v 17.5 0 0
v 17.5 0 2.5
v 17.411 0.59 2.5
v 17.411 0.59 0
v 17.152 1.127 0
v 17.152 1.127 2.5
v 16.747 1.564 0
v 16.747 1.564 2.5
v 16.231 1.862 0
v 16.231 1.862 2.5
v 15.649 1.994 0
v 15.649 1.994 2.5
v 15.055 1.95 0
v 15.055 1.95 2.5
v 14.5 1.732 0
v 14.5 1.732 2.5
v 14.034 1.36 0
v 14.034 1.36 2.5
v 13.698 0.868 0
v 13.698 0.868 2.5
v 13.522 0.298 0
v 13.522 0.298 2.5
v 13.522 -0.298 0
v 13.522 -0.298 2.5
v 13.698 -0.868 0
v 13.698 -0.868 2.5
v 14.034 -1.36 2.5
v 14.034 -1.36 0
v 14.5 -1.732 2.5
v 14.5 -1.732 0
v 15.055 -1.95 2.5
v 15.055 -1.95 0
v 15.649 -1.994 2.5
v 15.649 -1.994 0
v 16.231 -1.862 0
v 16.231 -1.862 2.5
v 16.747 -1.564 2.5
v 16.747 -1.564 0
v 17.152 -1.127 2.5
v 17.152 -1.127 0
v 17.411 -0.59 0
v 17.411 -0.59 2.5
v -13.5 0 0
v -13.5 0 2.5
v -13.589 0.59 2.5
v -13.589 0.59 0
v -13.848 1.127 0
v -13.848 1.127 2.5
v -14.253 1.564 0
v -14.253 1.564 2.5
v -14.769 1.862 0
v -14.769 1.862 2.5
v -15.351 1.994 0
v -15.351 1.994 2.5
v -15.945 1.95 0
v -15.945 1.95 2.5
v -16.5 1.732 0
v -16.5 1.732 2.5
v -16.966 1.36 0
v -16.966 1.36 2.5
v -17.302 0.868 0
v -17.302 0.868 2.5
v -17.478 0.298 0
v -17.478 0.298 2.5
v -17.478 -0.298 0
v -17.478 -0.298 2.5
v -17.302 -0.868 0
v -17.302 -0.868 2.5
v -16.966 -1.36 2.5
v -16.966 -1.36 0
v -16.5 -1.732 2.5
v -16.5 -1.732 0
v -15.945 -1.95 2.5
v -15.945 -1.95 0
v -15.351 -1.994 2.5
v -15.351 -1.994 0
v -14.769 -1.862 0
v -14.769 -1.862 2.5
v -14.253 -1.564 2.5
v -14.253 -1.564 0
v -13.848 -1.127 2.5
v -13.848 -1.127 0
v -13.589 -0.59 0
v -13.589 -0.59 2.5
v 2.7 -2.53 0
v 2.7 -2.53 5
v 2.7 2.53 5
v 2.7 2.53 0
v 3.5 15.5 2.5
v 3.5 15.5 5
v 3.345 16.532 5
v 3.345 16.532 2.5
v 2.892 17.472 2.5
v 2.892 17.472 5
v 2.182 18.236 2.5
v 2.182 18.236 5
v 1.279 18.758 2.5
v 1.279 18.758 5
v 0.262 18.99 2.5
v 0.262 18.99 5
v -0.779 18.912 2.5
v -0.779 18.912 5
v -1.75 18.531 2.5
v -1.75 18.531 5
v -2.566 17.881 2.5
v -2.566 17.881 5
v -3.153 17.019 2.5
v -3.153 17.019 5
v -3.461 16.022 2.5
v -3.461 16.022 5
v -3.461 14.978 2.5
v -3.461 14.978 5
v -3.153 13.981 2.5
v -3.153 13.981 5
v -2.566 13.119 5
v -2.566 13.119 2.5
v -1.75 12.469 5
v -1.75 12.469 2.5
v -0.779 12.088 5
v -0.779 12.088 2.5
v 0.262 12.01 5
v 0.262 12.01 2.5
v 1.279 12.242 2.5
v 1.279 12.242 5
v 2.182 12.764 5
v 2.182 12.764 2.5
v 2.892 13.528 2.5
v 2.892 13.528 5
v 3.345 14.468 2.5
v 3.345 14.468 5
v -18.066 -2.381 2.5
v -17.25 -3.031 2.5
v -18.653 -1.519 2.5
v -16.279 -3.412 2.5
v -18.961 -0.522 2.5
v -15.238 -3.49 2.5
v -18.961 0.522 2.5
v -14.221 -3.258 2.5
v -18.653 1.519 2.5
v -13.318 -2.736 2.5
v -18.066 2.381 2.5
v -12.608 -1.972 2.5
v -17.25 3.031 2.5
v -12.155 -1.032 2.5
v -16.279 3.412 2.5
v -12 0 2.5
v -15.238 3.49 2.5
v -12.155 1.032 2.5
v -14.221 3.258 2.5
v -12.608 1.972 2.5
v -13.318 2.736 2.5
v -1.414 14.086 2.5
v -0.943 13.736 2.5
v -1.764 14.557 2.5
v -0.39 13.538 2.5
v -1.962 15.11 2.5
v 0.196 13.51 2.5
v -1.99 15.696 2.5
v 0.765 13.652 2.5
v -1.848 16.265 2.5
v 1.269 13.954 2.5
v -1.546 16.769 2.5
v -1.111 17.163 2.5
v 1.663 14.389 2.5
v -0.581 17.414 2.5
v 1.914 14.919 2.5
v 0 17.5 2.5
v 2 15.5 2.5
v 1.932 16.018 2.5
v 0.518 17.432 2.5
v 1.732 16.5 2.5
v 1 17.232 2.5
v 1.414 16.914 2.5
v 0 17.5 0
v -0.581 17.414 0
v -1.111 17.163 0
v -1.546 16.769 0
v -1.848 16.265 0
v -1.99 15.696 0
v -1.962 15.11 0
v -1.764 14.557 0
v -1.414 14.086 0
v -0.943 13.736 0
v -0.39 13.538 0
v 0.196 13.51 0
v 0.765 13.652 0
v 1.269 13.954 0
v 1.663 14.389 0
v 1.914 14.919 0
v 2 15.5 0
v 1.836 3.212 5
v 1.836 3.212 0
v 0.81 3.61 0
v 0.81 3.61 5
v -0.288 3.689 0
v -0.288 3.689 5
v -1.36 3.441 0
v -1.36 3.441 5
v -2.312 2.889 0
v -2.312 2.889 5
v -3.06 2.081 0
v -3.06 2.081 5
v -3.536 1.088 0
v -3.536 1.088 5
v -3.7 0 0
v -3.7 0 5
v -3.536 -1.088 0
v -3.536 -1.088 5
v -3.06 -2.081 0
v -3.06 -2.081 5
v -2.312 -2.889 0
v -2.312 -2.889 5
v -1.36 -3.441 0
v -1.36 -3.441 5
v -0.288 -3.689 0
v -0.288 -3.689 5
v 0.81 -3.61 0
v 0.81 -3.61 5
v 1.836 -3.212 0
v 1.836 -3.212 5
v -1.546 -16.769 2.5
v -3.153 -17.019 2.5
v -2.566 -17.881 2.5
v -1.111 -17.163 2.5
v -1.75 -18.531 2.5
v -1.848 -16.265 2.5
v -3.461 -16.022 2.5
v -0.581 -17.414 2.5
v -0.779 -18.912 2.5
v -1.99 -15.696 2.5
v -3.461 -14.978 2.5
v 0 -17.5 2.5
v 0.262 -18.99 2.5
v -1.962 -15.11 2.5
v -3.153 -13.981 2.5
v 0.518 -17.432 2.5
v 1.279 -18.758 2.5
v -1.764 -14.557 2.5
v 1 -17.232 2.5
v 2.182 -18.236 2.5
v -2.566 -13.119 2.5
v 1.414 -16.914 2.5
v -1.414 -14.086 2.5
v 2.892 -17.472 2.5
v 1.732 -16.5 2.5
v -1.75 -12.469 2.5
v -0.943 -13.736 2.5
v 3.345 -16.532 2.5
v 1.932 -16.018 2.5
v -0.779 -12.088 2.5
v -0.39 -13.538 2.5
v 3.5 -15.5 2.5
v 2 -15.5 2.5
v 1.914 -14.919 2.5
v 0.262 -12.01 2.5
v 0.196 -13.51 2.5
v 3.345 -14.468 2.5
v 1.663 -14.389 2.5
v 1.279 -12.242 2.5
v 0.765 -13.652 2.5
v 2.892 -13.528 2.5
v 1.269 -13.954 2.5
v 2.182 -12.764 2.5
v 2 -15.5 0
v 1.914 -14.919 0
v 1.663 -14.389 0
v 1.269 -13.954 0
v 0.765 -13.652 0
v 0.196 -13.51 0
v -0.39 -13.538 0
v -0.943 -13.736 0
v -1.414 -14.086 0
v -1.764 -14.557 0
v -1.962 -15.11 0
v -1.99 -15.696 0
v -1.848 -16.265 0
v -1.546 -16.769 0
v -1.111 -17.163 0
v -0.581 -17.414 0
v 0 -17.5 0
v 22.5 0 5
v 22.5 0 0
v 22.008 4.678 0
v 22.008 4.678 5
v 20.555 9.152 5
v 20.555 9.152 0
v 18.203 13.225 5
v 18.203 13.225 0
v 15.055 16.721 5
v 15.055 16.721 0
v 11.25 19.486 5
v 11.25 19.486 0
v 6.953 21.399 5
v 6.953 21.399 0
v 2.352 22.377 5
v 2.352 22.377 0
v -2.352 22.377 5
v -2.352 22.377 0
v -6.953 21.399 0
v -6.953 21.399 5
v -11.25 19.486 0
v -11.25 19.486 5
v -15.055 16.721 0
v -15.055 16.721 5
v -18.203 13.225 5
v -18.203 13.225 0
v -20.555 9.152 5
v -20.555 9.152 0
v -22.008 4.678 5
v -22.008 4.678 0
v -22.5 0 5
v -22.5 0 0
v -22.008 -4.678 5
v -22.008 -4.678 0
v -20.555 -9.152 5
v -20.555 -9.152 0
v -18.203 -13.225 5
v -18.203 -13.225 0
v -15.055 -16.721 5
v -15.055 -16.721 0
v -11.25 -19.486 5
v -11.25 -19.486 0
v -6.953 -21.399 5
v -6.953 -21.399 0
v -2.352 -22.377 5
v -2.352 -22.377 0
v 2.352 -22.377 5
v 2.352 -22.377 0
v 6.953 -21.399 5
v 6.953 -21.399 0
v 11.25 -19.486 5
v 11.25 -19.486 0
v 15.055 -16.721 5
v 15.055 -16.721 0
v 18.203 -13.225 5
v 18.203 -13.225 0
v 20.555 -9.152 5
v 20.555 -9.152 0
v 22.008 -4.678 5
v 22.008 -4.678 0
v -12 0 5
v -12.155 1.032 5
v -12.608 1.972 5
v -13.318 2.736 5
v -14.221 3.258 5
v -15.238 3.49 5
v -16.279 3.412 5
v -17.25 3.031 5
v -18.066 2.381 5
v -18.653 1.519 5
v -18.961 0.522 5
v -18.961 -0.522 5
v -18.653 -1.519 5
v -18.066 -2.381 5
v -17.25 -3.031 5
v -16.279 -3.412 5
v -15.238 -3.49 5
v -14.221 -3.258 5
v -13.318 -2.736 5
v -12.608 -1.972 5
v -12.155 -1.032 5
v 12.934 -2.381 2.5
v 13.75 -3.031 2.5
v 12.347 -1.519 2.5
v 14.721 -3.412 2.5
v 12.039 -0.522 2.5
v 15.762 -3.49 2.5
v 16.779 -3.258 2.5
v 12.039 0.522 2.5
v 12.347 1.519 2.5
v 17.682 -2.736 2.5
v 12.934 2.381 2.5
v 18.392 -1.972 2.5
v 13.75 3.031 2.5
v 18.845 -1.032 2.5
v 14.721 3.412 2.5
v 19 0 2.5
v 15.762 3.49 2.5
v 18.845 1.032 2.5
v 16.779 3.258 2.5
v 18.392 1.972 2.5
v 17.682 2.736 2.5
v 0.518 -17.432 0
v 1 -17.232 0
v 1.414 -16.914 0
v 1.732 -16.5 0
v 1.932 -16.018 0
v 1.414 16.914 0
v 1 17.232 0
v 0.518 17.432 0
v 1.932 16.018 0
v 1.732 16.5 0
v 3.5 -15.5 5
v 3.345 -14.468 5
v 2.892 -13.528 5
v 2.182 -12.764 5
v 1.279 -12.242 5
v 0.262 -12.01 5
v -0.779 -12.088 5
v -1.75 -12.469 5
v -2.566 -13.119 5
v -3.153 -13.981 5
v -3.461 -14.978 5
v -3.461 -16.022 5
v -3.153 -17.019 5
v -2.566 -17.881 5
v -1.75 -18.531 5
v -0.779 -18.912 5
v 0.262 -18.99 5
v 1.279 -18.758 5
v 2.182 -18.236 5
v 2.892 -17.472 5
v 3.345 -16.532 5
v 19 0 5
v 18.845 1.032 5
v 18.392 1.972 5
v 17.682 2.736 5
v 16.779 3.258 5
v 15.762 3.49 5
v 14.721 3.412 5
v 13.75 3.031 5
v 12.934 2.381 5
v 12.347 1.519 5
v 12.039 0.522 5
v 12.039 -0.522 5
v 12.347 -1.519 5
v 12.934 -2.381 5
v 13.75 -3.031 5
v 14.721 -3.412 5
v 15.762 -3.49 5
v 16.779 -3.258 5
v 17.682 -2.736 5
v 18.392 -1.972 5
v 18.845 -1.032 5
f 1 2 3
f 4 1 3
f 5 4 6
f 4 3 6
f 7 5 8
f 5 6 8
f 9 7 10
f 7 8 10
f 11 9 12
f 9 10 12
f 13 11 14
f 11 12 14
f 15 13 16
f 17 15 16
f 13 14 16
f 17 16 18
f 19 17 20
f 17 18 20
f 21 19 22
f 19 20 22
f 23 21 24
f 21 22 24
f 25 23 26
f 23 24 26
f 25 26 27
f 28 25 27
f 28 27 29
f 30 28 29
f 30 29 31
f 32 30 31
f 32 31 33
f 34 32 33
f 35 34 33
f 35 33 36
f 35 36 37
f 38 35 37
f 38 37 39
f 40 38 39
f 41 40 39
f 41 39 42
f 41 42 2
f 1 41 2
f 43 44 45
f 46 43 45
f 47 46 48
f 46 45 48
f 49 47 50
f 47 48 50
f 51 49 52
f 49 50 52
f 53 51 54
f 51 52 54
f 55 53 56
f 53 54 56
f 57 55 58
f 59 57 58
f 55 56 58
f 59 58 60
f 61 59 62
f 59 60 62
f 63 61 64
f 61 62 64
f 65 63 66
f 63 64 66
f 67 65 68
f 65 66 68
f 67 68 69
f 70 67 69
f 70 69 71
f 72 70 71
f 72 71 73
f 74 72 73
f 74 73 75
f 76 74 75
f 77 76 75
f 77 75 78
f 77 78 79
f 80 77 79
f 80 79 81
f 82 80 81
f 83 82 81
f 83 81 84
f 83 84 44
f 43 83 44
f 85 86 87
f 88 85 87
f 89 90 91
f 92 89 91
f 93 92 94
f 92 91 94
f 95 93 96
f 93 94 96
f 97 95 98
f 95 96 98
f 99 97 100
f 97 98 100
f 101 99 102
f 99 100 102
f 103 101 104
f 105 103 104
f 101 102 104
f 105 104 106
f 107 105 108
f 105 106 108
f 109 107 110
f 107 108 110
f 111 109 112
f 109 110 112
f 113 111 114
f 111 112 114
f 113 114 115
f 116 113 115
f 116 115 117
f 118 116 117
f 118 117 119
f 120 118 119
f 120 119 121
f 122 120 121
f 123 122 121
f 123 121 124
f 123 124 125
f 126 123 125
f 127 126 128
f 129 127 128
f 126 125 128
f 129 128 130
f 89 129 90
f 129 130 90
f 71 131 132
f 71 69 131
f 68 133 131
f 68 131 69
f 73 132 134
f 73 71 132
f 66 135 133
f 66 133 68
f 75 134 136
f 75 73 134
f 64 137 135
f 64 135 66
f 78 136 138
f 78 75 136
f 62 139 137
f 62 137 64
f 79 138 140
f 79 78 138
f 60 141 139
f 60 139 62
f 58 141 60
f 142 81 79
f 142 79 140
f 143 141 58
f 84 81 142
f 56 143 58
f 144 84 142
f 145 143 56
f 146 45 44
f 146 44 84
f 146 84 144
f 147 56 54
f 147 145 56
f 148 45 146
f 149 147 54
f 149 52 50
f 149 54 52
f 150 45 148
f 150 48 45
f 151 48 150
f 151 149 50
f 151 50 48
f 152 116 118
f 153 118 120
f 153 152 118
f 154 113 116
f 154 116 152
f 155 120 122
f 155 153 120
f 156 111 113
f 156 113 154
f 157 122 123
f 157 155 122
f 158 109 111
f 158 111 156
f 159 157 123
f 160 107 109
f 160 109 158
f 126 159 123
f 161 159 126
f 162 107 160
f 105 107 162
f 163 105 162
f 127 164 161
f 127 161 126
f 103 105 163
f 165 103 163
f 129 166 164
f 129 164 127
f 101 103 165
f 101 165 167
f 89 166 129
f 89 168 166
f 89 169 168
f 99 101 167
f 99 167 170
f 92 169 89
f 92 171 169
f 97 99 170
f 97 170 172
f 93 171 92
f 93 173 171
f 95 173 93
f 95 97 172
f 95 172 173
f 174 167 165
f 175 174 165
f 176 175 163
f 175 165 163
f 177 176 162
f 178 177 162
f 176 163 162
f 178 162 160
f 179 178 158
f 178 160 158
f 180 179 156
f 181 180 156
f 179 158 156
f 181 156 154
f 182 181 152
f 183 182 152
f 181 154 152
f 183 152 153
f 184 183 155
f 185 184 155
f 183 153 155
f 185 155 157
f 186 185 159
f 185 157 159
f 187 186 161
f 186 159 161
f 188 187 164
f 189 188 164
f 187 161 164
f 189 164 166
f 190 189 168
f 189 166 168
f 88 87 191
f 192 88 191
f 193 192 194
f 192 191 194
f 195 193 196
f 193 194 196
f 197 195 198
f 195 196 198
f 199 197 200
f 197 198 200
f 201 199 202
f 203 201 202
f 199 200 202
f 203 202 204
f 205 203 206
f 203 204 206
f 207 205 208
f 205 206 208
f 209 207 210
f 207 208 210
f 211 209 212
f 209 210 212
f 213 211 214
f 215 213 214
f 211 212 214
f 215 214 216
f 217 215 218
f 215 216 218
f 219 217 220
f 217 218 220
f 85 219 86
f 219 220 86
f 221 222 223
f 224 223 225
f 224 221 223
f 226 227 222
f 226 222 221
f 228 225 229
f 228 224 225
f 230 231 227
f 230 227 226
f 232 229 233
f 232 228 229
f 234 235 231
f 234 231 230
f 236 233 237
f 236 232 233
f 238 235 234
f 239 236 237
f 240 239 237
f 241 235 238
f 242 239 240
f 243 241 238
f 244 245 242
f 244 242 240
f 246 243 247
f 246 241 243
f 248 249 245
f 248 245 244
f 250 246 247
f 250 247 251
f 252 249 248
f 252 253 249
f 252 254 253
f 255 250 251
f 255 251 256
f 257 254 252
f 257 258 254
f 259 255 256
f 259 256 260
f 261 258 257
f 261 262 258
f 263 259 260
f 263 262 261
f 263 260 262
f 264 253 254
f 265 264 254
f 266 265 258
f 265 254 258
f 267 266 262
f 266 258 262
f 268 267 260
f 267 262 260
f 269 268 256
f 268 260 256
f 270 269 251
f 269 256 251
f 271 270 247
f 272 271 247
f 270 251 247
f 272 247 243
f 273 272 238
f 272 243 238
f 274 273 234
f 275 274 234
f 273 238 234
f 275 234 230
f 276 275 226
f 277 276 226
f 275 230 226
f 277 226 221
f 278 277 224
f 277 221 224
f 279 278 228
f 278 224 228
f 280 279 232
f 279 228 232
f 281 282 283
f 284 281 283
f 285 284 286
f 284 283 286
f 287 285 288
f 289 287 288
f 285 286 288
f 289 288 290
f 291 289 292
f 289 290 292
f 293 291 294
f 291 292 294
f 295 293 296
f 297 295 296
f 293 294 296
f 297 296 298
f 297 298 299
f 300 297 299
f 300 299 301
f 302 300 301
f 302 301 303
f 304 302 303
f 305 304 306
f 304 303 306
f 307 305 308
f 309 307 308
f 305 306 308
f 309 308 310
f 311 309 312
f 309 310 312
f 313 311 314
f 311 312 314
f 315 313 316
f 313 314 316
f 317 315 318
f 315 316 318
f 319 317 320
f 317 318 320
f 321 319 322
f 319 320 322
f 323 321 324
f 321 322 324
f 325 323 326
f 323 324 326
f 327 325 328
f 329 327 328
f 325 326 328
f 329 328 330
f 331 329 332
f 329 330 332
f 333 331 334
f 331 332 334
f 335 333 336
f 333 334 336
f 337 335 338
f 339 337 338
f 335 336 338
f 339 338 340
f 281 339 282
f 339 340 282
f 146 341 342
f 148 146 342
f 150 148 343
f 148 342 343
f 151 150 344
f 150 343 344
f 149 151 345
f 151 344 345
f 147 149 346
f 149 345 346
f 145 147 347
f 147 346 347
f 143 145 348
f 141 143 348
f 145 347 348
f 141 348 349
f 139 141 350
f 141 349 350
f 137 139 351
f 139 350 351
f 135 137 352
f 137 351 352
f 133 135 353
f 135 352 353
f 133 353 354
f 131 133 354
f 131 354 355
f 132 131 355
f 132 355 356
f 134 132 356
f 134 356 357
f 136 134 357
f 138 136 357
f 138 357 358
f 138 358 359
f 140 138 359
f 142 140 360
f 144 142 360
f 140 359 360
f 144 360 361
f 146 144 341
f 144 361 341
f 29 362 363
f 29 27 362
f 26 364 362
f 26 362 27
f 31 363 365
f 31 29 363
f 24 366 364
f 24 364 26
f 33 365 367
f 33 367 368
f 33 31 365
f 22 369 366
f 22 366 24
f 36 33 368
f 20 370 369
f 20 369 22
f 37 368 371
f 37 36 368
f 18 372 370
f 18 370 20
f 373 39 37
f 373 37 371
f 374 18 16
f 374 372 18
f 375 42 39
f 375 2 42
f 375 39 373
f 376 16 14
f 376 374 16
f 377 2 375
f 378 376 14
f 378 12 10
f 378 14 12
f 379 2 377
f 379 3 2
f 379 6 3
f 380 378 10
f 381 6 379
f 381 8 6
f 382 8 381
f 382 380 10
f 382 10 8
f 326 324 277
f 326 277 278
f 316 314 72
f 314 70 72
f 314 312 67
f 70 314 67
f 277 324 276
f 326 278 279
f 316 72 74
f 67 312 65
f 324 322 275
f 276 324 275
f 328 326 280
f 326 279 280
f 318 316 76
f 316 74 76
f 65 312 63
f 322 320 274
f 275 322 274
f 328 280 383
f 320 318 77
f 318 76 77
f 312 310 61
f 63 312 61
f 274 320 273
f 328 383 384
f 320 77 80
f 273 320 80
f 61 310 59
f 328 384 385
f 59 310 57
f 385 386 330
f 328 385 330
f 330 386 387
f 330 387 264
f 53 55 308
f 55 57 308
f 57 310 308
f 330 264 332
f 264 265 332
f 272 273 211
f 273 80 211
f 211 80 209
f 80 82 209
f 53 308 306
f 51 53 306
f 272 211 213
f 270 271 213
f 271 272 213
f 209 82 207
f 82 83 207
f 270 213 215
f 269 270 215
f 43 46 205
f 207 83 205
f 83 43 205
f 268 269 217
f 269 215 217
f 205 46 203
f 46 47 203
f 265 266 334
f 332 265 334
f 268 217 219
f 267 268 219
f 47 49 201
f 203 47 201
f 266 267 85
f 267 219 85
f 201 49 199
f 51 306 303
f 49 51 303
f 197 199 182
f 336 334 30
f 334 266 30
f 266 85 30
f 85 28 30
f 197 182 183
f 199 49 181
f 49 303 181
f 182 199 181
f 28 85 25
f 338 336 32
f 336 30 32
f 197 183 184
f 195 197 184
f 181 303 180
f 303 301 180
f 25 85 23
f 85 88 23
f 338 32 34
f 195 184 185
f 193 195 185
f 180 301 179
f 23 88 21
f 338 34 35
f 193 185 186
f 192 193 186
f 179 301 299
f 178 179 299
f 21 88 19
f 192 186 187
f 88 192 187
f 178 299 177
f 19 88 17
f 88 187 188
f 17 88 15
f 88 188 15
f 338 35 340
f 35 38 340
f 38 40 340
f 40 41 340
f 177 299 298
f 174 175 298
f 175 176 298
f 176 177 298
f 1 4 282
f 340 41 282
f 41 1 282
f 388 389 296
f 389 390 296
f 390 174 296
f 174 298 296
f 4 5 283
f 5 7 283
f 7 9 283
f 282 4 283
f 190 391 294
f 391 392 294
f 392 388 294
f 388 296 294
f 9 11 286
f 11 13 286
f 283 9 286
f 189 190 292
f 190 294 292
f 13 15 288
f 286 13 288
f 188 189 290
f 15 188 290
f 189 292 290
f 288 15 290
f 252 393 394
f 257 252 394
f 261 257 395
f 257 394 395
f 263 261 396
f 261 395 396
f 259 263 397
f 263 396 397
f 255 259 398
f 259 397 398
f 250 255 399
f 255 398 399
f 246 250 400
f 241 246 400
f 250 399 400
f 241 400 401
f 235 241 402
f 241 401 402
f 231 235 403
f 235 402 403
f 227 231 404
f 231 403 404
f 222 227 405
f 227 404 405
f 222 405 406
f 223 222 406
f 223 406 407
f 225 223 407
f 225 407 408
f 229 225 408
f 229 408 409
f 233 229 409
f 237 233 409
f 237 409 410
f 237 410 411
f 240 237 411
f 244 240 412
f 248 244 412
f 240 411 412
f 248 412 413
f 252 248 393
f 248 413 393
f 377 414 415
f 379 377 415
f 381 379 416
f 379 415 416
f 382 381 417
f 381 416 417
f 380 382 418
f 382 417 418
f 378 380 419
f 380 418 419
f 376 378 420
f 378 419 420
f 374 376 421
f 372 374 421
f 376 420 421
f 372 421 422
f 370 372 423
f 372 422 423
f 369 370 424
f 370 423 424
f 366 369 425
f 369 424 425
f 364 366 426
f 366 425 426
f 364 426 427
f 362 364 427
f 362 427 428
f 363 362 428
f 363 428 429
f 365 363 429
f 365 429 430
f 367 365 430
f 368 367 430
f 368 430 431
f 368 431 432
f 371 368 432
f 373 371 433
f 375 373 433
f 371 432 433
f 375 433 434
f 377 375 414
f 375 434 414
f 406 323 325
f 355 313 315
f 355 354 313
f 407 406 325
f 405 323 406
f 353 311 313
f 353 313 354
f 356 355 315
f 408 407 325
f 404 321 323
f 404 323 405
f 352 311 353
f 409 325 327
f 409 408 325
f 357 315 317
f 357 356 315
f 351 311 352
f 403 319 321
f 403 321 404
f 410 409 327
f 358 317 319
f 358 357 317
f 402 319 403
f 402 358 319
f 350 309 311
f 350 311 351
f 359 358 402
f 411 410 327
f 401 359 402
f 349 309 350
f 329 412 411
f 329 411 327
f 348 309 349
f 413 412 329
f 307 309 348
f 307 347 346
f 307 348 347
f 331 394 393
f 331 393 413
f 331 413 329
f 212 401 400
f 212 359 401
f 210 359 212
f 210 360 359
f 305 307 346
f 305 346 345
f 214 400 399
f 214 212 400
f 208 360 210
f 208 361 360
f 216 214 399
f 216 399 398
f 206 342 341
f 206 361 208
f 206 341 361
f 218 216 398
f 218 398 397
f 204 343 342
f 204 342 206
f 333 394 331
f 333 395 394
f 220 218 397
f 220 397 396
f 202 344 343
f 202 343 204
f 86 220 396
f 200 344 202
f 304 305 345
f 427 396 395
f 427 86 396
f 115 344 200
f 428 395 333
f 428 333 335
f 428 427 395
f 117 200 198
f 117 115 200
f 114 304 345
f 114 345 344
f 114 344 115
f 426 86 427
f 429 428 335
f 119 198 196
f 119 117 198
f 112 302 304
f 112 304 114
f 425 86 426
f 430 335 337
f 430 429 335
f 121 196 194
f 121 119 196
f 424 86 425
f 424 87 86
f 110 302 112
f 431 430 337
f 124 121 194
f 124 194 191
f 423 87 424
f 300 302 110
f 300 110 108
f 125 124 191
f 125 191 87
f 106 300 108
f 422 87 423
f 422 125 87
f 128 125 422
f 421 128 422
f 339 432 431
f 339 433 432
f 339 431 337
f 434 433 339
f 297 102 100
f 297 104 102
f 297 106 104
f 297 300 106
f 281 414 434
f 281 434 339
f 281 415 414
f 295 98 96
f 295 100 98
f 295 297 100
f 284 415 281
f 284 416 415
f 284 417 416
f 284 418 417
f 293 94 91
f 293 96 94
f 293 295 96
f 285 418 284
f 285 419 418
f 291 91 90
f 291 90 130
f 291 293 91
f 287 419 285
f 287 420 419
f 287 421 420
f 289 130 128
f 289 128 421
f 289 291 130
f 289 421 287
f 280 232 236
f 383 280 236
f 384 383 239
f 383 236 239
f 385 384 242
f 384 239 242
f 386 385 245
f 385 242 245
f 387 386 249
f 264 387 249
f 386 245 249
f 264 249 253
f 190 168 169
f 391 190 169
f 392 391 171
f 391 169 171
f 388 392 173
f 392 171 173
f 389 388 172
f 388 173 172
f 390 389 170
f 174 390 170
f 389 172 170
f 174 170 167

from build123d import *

# Parameters (mm, degrees)
F0_R     = 22.5
F1_DEPTH = 5
F3_DEPTH = 25
F5_DEPTH = 25
F6_R     = 2
F7_DEPTH = 25
F8_R     = 3.5
F9_DEPTH = 2.5


with BuildPart() as f1:
    # F0 (on Top) → F1 (new body)
    with BuildSketch(Plane.XY):
        Circle(F0_R)
    extrude(amount=F1_DEPTH)

    # F2 (on face) → F3 (cut)
    with BuildSketch(Plane.XY.offset(5)):
        with BuildLine():
            Line((2.7, 0), (2.7, 2.5298221281))
            ThreePointArc((2.7, 2.5298221281), (-3.7, 0), (2.7, -2.5298221281))
            Line((2.7, -2.5298221281), (2.7, 0))
        make_face()
    extrude(amount=-F3_DEPTH, mode=Mode.SUBTRACT)

    # F4 (on face) → F5 (cut)
    with BuildSketch(Plane.XY.offset(5)):
        with BuildLine():
            ThreePointArc((0, 17.5), (-1.4142135624, 14.0857864376), (2, 15.5))
            ThreePointArc((2, 15.5), (1.4142135624, 16.9142135624), (0, 17.5))
        make_face()
    extrude(amount=-F5_DEPTH, mode=Mode.SUBTRACT)

    # F6 (on face) → F7 (cut)
    with BuildSketch(Plane.XY.offset(5)):
        with Locations((15.5, 0)):
            Circle(F6_R)
        with BuildLine():
            ThreePointArc((0, -17.5), (1.4142135624, -16.9142135624), (2, -15.5))
            ThreePointArc((2, -15.5), (-1.4142135624, -14.0857864376), (0, -17.5))
        make_face()
        with BuildLine():
            ThreePointArc((-17.5, 0), (-15.5, -2), (-13.5, 0))
            ThreePointArc((-13.5, 0), (-15.5, 2), (-17.5, 0))
        make_face()
    extrude(amount=-F7_DEPTH, mode=Mode.SUBTRACT)

    # F8 (on face) → F9 (cut)
    with BuildSketch(Plane.XY.offset(5)):
        with Locations((-15.5, 0)):
            Circle(F8_R)
        with Locations((15.5, 0)):
            Circle(F8_R)
        with Locations((0, -15.5)):
            Circle(F8_R)
        with Locations((0, 15.5)):
            Circle(F8_R)
    extrude(amount=-F9_DEPTH, mode=Mode.SUBTRACT)


solid = f1.part
